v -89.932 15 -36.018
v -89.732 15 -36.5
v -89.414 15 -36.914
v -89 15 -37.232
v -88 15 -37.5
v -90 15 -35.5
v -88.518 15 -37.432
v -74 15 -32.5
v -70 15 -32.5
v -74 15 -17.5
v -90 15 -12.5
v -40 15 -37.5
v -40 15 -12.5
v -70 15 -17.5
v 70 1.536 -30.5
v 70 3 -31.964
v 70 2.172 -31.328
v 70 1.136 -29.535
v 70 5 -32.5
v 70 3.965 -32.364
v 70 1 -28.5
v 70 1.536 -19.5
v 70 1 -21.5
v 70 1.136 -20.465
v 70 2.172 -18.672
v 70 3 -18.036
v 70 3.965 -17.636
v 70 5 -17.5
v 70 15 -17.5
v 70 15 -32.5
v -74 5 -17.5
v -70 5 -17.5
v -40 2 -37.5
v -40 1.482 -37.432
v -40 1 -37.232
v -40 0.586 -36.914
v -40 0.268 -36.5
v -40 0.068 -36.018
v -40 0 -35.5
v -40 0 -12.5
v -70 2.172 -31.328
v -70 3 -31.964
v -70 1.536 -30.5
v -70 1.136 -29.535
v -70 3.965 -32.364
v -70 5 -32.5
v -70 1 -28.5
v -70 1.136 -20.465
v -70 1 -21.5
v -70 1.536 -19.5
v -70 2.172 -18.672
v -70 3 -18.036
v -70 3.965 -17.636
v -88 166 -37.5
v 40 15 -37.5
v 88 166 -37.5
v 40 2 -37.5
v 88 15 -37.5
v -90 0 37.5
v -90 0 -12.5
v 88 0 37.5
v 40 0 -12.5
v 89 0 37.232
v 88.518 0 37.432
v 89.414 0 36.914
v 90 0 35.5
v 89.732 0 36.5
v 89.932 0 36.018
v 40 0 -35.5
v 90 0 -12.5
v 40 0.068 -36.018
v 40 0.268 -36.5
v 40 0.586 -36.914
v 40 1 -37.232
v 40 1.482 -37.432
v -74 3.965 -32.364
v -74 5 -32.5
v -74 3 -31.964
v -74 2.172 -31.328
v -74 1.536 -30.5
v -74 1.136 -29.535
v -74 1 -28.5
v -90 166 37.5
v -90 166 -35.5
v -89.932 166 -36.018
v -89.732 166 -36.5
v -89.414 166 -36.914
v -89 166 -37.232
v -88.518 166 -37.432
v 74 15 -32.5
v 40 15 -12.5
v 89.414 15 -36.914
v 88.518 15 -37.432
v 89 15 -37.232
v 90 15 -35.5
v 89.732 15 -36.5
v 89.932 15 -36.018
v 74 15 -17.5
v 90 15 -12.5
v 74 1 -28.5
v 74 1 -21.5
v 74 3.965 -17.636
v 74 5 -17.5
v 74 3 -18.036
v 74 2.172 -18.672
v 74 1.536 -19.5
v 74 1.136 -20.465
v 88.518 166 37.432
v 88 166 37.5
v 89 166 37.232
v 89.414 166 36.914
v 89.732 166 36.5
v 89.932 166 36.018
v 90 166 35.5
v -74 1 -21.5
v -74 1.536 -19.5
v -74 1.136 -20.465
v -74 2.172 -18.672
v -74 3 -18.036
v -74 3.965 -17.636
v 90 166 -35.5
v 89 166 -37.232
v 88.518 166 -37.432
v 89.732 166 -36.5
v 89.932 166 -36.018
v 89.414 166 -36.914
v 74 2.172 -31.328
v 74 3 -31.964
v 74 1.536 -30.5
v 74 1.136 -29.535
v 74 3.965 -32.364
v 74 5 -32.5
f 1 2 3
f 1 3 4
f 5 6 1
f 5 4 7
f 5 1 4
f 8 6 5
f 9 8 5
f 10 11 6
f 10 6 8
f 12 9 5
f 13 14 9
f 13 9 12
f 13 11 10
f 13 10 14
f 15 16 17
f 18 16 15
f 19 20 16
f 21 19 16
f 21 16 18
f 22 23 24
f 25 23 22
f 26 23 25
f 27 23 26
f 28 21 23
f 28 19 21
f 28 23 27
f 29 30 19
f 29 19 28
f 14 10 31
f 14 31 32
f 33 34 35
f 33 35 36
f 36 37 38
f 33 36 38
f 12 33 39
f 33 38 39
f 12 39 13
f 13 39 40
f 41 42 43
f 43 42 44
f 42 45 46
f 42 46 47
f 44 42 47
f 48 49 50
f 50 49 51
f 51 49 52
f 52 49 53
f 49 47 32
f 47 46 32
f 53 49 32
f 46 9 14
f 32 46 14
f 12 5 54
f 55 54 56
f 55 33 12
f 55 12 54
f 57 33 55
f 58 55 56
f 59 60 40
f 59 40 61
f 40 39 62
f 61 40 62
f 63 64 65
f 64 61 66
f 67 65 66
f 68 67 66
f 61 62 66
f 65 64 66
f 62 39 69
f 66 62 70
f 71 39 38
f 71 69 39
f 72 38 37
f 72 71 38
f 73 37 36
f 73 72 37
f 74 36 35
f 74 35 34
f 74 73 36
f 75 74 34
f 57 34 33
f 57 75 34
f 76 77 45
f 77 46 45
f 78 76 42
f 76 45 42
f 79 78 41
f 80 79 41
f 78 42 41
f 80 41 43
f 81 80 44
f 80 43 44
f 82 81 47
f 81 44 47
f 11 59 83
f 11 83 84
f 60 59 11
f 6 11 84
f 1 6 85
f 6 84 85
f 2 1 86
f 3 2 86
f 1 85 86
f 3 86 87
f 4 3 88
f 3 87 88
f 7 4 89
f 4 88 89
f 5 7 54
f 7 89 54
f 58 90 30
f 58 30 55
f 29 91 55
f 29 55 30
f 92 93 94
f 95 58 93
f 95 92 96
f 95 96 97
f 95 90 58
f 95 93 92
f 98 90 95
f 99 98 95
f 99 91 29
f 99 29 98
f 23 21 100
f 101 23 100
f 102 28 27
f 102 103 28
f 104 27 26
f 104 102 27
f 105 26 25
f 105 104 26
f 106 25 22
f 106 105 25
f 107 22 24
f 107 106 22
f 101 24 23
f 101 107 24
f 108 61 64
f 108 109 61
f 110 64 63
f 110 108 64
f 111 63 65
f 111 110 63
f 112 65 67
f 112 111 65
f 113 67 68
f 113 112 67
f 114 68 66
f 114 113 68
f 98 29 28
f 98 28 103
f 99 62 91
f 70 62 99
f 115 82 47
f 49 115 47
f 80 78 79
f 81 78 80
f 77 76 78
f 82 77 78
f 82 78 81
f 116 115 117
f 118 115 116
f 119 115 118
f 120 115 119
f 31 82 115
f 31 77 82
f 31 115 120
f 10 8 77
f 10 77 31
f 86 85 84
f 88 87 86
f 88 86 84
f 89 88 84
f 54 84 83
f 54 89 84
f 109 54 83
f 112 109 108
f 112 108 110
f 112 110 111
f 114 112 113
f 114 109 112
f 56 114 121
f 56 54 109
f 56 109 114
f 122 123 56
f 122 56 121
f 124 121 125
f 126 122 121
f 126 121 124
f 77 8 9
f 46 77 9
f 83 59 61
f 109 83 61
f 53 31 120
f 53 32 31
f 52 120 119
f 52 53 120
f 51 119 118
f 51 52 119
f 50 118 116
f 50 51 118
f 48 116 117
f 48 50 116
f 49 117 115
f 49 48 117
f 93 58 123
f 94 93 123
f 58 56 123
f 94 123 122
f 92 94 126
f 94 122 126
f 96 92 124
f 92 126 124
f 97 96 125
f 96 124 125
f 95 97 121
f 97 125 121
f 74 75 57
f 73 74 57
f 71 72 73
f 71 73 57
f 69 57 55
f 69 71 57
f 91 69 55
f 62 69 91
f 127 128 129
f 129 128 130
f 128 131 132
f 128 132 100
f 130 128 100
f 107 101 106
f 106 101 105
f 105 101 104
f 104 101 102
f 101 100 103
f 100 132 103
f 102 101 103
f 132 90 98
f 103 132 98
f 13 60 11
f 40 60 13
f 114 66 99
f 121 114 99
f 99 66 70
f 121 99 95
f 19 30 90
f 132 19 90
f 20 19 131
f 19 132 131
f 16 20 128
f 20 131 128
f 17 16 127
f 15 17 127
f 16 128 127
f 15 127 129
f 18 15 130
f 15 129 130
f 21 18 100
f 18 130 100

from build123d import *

# Parameters (mm, degrees)
SKETCH1_W           = 180
SKETCH1_H           = 75
BOSS_EXTRUDE1_DEPTH = 166
SKETCH2_W           = 50
SKETCH2_H           = 25
CUT_EXTRUDE1_DEPTH  = 15
FILLET1_R           = 2
SKETCH3_W           = 4
SKETCH3_H           = 15
BOSS_EXTRUDE2_DEPTH = 14
FILLET2_R           = 4


with BuildPart() as part:
    # Sketch1 → Boss-Extrude1 (new body)
    with BuildSketch(Plane(origin=(0, 0, 0), x_dir=(1, 0, 0), z_dir=(0, 1, 0))):
        Rectangle(SKETCH1_W, SKETCH1_H)
    extrude(amount=BOSS_EXTRUDE1_DEPTH)

    # Sketch2 → Cut-Extrude1 (cut)
    with BuildSketch(Plane.XZ):
        with Locations((-65, -25)):
            Rectangle(SKETCH2_W, SKETCH2_H)
        with Locations((65, -25)):
            Rectangle(SKETCH2_W, SKETCH2_H)
    extrude(amount=-CUT_EXTRUDE1_DEPTH, mode=Mode.SUBTRACT)

    # Fillet1
    fillet1_edges = [part.edges().sort_by_distance(p)[0] for p in [
        (0, 0, -37.5),
        (-90, 90.5, -37.5),
        (90, 90.5, -37.5),
        (90, 83, 37.5),
    ]]
    fillet(fillet1_edges, radius=FILLET1_R)

    # Sketch3 → Boss-Extrude2 (add)
    with BuildSketch(Plane.XZ.offset(-15)):
        with Locations((-72, -25)):
            Rectangle(SKETCH3_W, SKETCH3_H)
        with Locations((72, -25)):
            Rectangle(SKETCH3_W, SKETCH3_H)
    extrude(amount=BOSS_EXTRUDE2_DEPTH)

    # Fillet2
    fillet2_edges = [part.edges().sort_by_distance(p)[0] for p in [
        (-72, 1, -32.5),
        (-72, 1, -17.5),
        (72, 1, -17.5),
        (72, 1, -32.5),
    ]]
    fillet(fillet2_edges, radius=FILLET2_R)


solid = part.part
